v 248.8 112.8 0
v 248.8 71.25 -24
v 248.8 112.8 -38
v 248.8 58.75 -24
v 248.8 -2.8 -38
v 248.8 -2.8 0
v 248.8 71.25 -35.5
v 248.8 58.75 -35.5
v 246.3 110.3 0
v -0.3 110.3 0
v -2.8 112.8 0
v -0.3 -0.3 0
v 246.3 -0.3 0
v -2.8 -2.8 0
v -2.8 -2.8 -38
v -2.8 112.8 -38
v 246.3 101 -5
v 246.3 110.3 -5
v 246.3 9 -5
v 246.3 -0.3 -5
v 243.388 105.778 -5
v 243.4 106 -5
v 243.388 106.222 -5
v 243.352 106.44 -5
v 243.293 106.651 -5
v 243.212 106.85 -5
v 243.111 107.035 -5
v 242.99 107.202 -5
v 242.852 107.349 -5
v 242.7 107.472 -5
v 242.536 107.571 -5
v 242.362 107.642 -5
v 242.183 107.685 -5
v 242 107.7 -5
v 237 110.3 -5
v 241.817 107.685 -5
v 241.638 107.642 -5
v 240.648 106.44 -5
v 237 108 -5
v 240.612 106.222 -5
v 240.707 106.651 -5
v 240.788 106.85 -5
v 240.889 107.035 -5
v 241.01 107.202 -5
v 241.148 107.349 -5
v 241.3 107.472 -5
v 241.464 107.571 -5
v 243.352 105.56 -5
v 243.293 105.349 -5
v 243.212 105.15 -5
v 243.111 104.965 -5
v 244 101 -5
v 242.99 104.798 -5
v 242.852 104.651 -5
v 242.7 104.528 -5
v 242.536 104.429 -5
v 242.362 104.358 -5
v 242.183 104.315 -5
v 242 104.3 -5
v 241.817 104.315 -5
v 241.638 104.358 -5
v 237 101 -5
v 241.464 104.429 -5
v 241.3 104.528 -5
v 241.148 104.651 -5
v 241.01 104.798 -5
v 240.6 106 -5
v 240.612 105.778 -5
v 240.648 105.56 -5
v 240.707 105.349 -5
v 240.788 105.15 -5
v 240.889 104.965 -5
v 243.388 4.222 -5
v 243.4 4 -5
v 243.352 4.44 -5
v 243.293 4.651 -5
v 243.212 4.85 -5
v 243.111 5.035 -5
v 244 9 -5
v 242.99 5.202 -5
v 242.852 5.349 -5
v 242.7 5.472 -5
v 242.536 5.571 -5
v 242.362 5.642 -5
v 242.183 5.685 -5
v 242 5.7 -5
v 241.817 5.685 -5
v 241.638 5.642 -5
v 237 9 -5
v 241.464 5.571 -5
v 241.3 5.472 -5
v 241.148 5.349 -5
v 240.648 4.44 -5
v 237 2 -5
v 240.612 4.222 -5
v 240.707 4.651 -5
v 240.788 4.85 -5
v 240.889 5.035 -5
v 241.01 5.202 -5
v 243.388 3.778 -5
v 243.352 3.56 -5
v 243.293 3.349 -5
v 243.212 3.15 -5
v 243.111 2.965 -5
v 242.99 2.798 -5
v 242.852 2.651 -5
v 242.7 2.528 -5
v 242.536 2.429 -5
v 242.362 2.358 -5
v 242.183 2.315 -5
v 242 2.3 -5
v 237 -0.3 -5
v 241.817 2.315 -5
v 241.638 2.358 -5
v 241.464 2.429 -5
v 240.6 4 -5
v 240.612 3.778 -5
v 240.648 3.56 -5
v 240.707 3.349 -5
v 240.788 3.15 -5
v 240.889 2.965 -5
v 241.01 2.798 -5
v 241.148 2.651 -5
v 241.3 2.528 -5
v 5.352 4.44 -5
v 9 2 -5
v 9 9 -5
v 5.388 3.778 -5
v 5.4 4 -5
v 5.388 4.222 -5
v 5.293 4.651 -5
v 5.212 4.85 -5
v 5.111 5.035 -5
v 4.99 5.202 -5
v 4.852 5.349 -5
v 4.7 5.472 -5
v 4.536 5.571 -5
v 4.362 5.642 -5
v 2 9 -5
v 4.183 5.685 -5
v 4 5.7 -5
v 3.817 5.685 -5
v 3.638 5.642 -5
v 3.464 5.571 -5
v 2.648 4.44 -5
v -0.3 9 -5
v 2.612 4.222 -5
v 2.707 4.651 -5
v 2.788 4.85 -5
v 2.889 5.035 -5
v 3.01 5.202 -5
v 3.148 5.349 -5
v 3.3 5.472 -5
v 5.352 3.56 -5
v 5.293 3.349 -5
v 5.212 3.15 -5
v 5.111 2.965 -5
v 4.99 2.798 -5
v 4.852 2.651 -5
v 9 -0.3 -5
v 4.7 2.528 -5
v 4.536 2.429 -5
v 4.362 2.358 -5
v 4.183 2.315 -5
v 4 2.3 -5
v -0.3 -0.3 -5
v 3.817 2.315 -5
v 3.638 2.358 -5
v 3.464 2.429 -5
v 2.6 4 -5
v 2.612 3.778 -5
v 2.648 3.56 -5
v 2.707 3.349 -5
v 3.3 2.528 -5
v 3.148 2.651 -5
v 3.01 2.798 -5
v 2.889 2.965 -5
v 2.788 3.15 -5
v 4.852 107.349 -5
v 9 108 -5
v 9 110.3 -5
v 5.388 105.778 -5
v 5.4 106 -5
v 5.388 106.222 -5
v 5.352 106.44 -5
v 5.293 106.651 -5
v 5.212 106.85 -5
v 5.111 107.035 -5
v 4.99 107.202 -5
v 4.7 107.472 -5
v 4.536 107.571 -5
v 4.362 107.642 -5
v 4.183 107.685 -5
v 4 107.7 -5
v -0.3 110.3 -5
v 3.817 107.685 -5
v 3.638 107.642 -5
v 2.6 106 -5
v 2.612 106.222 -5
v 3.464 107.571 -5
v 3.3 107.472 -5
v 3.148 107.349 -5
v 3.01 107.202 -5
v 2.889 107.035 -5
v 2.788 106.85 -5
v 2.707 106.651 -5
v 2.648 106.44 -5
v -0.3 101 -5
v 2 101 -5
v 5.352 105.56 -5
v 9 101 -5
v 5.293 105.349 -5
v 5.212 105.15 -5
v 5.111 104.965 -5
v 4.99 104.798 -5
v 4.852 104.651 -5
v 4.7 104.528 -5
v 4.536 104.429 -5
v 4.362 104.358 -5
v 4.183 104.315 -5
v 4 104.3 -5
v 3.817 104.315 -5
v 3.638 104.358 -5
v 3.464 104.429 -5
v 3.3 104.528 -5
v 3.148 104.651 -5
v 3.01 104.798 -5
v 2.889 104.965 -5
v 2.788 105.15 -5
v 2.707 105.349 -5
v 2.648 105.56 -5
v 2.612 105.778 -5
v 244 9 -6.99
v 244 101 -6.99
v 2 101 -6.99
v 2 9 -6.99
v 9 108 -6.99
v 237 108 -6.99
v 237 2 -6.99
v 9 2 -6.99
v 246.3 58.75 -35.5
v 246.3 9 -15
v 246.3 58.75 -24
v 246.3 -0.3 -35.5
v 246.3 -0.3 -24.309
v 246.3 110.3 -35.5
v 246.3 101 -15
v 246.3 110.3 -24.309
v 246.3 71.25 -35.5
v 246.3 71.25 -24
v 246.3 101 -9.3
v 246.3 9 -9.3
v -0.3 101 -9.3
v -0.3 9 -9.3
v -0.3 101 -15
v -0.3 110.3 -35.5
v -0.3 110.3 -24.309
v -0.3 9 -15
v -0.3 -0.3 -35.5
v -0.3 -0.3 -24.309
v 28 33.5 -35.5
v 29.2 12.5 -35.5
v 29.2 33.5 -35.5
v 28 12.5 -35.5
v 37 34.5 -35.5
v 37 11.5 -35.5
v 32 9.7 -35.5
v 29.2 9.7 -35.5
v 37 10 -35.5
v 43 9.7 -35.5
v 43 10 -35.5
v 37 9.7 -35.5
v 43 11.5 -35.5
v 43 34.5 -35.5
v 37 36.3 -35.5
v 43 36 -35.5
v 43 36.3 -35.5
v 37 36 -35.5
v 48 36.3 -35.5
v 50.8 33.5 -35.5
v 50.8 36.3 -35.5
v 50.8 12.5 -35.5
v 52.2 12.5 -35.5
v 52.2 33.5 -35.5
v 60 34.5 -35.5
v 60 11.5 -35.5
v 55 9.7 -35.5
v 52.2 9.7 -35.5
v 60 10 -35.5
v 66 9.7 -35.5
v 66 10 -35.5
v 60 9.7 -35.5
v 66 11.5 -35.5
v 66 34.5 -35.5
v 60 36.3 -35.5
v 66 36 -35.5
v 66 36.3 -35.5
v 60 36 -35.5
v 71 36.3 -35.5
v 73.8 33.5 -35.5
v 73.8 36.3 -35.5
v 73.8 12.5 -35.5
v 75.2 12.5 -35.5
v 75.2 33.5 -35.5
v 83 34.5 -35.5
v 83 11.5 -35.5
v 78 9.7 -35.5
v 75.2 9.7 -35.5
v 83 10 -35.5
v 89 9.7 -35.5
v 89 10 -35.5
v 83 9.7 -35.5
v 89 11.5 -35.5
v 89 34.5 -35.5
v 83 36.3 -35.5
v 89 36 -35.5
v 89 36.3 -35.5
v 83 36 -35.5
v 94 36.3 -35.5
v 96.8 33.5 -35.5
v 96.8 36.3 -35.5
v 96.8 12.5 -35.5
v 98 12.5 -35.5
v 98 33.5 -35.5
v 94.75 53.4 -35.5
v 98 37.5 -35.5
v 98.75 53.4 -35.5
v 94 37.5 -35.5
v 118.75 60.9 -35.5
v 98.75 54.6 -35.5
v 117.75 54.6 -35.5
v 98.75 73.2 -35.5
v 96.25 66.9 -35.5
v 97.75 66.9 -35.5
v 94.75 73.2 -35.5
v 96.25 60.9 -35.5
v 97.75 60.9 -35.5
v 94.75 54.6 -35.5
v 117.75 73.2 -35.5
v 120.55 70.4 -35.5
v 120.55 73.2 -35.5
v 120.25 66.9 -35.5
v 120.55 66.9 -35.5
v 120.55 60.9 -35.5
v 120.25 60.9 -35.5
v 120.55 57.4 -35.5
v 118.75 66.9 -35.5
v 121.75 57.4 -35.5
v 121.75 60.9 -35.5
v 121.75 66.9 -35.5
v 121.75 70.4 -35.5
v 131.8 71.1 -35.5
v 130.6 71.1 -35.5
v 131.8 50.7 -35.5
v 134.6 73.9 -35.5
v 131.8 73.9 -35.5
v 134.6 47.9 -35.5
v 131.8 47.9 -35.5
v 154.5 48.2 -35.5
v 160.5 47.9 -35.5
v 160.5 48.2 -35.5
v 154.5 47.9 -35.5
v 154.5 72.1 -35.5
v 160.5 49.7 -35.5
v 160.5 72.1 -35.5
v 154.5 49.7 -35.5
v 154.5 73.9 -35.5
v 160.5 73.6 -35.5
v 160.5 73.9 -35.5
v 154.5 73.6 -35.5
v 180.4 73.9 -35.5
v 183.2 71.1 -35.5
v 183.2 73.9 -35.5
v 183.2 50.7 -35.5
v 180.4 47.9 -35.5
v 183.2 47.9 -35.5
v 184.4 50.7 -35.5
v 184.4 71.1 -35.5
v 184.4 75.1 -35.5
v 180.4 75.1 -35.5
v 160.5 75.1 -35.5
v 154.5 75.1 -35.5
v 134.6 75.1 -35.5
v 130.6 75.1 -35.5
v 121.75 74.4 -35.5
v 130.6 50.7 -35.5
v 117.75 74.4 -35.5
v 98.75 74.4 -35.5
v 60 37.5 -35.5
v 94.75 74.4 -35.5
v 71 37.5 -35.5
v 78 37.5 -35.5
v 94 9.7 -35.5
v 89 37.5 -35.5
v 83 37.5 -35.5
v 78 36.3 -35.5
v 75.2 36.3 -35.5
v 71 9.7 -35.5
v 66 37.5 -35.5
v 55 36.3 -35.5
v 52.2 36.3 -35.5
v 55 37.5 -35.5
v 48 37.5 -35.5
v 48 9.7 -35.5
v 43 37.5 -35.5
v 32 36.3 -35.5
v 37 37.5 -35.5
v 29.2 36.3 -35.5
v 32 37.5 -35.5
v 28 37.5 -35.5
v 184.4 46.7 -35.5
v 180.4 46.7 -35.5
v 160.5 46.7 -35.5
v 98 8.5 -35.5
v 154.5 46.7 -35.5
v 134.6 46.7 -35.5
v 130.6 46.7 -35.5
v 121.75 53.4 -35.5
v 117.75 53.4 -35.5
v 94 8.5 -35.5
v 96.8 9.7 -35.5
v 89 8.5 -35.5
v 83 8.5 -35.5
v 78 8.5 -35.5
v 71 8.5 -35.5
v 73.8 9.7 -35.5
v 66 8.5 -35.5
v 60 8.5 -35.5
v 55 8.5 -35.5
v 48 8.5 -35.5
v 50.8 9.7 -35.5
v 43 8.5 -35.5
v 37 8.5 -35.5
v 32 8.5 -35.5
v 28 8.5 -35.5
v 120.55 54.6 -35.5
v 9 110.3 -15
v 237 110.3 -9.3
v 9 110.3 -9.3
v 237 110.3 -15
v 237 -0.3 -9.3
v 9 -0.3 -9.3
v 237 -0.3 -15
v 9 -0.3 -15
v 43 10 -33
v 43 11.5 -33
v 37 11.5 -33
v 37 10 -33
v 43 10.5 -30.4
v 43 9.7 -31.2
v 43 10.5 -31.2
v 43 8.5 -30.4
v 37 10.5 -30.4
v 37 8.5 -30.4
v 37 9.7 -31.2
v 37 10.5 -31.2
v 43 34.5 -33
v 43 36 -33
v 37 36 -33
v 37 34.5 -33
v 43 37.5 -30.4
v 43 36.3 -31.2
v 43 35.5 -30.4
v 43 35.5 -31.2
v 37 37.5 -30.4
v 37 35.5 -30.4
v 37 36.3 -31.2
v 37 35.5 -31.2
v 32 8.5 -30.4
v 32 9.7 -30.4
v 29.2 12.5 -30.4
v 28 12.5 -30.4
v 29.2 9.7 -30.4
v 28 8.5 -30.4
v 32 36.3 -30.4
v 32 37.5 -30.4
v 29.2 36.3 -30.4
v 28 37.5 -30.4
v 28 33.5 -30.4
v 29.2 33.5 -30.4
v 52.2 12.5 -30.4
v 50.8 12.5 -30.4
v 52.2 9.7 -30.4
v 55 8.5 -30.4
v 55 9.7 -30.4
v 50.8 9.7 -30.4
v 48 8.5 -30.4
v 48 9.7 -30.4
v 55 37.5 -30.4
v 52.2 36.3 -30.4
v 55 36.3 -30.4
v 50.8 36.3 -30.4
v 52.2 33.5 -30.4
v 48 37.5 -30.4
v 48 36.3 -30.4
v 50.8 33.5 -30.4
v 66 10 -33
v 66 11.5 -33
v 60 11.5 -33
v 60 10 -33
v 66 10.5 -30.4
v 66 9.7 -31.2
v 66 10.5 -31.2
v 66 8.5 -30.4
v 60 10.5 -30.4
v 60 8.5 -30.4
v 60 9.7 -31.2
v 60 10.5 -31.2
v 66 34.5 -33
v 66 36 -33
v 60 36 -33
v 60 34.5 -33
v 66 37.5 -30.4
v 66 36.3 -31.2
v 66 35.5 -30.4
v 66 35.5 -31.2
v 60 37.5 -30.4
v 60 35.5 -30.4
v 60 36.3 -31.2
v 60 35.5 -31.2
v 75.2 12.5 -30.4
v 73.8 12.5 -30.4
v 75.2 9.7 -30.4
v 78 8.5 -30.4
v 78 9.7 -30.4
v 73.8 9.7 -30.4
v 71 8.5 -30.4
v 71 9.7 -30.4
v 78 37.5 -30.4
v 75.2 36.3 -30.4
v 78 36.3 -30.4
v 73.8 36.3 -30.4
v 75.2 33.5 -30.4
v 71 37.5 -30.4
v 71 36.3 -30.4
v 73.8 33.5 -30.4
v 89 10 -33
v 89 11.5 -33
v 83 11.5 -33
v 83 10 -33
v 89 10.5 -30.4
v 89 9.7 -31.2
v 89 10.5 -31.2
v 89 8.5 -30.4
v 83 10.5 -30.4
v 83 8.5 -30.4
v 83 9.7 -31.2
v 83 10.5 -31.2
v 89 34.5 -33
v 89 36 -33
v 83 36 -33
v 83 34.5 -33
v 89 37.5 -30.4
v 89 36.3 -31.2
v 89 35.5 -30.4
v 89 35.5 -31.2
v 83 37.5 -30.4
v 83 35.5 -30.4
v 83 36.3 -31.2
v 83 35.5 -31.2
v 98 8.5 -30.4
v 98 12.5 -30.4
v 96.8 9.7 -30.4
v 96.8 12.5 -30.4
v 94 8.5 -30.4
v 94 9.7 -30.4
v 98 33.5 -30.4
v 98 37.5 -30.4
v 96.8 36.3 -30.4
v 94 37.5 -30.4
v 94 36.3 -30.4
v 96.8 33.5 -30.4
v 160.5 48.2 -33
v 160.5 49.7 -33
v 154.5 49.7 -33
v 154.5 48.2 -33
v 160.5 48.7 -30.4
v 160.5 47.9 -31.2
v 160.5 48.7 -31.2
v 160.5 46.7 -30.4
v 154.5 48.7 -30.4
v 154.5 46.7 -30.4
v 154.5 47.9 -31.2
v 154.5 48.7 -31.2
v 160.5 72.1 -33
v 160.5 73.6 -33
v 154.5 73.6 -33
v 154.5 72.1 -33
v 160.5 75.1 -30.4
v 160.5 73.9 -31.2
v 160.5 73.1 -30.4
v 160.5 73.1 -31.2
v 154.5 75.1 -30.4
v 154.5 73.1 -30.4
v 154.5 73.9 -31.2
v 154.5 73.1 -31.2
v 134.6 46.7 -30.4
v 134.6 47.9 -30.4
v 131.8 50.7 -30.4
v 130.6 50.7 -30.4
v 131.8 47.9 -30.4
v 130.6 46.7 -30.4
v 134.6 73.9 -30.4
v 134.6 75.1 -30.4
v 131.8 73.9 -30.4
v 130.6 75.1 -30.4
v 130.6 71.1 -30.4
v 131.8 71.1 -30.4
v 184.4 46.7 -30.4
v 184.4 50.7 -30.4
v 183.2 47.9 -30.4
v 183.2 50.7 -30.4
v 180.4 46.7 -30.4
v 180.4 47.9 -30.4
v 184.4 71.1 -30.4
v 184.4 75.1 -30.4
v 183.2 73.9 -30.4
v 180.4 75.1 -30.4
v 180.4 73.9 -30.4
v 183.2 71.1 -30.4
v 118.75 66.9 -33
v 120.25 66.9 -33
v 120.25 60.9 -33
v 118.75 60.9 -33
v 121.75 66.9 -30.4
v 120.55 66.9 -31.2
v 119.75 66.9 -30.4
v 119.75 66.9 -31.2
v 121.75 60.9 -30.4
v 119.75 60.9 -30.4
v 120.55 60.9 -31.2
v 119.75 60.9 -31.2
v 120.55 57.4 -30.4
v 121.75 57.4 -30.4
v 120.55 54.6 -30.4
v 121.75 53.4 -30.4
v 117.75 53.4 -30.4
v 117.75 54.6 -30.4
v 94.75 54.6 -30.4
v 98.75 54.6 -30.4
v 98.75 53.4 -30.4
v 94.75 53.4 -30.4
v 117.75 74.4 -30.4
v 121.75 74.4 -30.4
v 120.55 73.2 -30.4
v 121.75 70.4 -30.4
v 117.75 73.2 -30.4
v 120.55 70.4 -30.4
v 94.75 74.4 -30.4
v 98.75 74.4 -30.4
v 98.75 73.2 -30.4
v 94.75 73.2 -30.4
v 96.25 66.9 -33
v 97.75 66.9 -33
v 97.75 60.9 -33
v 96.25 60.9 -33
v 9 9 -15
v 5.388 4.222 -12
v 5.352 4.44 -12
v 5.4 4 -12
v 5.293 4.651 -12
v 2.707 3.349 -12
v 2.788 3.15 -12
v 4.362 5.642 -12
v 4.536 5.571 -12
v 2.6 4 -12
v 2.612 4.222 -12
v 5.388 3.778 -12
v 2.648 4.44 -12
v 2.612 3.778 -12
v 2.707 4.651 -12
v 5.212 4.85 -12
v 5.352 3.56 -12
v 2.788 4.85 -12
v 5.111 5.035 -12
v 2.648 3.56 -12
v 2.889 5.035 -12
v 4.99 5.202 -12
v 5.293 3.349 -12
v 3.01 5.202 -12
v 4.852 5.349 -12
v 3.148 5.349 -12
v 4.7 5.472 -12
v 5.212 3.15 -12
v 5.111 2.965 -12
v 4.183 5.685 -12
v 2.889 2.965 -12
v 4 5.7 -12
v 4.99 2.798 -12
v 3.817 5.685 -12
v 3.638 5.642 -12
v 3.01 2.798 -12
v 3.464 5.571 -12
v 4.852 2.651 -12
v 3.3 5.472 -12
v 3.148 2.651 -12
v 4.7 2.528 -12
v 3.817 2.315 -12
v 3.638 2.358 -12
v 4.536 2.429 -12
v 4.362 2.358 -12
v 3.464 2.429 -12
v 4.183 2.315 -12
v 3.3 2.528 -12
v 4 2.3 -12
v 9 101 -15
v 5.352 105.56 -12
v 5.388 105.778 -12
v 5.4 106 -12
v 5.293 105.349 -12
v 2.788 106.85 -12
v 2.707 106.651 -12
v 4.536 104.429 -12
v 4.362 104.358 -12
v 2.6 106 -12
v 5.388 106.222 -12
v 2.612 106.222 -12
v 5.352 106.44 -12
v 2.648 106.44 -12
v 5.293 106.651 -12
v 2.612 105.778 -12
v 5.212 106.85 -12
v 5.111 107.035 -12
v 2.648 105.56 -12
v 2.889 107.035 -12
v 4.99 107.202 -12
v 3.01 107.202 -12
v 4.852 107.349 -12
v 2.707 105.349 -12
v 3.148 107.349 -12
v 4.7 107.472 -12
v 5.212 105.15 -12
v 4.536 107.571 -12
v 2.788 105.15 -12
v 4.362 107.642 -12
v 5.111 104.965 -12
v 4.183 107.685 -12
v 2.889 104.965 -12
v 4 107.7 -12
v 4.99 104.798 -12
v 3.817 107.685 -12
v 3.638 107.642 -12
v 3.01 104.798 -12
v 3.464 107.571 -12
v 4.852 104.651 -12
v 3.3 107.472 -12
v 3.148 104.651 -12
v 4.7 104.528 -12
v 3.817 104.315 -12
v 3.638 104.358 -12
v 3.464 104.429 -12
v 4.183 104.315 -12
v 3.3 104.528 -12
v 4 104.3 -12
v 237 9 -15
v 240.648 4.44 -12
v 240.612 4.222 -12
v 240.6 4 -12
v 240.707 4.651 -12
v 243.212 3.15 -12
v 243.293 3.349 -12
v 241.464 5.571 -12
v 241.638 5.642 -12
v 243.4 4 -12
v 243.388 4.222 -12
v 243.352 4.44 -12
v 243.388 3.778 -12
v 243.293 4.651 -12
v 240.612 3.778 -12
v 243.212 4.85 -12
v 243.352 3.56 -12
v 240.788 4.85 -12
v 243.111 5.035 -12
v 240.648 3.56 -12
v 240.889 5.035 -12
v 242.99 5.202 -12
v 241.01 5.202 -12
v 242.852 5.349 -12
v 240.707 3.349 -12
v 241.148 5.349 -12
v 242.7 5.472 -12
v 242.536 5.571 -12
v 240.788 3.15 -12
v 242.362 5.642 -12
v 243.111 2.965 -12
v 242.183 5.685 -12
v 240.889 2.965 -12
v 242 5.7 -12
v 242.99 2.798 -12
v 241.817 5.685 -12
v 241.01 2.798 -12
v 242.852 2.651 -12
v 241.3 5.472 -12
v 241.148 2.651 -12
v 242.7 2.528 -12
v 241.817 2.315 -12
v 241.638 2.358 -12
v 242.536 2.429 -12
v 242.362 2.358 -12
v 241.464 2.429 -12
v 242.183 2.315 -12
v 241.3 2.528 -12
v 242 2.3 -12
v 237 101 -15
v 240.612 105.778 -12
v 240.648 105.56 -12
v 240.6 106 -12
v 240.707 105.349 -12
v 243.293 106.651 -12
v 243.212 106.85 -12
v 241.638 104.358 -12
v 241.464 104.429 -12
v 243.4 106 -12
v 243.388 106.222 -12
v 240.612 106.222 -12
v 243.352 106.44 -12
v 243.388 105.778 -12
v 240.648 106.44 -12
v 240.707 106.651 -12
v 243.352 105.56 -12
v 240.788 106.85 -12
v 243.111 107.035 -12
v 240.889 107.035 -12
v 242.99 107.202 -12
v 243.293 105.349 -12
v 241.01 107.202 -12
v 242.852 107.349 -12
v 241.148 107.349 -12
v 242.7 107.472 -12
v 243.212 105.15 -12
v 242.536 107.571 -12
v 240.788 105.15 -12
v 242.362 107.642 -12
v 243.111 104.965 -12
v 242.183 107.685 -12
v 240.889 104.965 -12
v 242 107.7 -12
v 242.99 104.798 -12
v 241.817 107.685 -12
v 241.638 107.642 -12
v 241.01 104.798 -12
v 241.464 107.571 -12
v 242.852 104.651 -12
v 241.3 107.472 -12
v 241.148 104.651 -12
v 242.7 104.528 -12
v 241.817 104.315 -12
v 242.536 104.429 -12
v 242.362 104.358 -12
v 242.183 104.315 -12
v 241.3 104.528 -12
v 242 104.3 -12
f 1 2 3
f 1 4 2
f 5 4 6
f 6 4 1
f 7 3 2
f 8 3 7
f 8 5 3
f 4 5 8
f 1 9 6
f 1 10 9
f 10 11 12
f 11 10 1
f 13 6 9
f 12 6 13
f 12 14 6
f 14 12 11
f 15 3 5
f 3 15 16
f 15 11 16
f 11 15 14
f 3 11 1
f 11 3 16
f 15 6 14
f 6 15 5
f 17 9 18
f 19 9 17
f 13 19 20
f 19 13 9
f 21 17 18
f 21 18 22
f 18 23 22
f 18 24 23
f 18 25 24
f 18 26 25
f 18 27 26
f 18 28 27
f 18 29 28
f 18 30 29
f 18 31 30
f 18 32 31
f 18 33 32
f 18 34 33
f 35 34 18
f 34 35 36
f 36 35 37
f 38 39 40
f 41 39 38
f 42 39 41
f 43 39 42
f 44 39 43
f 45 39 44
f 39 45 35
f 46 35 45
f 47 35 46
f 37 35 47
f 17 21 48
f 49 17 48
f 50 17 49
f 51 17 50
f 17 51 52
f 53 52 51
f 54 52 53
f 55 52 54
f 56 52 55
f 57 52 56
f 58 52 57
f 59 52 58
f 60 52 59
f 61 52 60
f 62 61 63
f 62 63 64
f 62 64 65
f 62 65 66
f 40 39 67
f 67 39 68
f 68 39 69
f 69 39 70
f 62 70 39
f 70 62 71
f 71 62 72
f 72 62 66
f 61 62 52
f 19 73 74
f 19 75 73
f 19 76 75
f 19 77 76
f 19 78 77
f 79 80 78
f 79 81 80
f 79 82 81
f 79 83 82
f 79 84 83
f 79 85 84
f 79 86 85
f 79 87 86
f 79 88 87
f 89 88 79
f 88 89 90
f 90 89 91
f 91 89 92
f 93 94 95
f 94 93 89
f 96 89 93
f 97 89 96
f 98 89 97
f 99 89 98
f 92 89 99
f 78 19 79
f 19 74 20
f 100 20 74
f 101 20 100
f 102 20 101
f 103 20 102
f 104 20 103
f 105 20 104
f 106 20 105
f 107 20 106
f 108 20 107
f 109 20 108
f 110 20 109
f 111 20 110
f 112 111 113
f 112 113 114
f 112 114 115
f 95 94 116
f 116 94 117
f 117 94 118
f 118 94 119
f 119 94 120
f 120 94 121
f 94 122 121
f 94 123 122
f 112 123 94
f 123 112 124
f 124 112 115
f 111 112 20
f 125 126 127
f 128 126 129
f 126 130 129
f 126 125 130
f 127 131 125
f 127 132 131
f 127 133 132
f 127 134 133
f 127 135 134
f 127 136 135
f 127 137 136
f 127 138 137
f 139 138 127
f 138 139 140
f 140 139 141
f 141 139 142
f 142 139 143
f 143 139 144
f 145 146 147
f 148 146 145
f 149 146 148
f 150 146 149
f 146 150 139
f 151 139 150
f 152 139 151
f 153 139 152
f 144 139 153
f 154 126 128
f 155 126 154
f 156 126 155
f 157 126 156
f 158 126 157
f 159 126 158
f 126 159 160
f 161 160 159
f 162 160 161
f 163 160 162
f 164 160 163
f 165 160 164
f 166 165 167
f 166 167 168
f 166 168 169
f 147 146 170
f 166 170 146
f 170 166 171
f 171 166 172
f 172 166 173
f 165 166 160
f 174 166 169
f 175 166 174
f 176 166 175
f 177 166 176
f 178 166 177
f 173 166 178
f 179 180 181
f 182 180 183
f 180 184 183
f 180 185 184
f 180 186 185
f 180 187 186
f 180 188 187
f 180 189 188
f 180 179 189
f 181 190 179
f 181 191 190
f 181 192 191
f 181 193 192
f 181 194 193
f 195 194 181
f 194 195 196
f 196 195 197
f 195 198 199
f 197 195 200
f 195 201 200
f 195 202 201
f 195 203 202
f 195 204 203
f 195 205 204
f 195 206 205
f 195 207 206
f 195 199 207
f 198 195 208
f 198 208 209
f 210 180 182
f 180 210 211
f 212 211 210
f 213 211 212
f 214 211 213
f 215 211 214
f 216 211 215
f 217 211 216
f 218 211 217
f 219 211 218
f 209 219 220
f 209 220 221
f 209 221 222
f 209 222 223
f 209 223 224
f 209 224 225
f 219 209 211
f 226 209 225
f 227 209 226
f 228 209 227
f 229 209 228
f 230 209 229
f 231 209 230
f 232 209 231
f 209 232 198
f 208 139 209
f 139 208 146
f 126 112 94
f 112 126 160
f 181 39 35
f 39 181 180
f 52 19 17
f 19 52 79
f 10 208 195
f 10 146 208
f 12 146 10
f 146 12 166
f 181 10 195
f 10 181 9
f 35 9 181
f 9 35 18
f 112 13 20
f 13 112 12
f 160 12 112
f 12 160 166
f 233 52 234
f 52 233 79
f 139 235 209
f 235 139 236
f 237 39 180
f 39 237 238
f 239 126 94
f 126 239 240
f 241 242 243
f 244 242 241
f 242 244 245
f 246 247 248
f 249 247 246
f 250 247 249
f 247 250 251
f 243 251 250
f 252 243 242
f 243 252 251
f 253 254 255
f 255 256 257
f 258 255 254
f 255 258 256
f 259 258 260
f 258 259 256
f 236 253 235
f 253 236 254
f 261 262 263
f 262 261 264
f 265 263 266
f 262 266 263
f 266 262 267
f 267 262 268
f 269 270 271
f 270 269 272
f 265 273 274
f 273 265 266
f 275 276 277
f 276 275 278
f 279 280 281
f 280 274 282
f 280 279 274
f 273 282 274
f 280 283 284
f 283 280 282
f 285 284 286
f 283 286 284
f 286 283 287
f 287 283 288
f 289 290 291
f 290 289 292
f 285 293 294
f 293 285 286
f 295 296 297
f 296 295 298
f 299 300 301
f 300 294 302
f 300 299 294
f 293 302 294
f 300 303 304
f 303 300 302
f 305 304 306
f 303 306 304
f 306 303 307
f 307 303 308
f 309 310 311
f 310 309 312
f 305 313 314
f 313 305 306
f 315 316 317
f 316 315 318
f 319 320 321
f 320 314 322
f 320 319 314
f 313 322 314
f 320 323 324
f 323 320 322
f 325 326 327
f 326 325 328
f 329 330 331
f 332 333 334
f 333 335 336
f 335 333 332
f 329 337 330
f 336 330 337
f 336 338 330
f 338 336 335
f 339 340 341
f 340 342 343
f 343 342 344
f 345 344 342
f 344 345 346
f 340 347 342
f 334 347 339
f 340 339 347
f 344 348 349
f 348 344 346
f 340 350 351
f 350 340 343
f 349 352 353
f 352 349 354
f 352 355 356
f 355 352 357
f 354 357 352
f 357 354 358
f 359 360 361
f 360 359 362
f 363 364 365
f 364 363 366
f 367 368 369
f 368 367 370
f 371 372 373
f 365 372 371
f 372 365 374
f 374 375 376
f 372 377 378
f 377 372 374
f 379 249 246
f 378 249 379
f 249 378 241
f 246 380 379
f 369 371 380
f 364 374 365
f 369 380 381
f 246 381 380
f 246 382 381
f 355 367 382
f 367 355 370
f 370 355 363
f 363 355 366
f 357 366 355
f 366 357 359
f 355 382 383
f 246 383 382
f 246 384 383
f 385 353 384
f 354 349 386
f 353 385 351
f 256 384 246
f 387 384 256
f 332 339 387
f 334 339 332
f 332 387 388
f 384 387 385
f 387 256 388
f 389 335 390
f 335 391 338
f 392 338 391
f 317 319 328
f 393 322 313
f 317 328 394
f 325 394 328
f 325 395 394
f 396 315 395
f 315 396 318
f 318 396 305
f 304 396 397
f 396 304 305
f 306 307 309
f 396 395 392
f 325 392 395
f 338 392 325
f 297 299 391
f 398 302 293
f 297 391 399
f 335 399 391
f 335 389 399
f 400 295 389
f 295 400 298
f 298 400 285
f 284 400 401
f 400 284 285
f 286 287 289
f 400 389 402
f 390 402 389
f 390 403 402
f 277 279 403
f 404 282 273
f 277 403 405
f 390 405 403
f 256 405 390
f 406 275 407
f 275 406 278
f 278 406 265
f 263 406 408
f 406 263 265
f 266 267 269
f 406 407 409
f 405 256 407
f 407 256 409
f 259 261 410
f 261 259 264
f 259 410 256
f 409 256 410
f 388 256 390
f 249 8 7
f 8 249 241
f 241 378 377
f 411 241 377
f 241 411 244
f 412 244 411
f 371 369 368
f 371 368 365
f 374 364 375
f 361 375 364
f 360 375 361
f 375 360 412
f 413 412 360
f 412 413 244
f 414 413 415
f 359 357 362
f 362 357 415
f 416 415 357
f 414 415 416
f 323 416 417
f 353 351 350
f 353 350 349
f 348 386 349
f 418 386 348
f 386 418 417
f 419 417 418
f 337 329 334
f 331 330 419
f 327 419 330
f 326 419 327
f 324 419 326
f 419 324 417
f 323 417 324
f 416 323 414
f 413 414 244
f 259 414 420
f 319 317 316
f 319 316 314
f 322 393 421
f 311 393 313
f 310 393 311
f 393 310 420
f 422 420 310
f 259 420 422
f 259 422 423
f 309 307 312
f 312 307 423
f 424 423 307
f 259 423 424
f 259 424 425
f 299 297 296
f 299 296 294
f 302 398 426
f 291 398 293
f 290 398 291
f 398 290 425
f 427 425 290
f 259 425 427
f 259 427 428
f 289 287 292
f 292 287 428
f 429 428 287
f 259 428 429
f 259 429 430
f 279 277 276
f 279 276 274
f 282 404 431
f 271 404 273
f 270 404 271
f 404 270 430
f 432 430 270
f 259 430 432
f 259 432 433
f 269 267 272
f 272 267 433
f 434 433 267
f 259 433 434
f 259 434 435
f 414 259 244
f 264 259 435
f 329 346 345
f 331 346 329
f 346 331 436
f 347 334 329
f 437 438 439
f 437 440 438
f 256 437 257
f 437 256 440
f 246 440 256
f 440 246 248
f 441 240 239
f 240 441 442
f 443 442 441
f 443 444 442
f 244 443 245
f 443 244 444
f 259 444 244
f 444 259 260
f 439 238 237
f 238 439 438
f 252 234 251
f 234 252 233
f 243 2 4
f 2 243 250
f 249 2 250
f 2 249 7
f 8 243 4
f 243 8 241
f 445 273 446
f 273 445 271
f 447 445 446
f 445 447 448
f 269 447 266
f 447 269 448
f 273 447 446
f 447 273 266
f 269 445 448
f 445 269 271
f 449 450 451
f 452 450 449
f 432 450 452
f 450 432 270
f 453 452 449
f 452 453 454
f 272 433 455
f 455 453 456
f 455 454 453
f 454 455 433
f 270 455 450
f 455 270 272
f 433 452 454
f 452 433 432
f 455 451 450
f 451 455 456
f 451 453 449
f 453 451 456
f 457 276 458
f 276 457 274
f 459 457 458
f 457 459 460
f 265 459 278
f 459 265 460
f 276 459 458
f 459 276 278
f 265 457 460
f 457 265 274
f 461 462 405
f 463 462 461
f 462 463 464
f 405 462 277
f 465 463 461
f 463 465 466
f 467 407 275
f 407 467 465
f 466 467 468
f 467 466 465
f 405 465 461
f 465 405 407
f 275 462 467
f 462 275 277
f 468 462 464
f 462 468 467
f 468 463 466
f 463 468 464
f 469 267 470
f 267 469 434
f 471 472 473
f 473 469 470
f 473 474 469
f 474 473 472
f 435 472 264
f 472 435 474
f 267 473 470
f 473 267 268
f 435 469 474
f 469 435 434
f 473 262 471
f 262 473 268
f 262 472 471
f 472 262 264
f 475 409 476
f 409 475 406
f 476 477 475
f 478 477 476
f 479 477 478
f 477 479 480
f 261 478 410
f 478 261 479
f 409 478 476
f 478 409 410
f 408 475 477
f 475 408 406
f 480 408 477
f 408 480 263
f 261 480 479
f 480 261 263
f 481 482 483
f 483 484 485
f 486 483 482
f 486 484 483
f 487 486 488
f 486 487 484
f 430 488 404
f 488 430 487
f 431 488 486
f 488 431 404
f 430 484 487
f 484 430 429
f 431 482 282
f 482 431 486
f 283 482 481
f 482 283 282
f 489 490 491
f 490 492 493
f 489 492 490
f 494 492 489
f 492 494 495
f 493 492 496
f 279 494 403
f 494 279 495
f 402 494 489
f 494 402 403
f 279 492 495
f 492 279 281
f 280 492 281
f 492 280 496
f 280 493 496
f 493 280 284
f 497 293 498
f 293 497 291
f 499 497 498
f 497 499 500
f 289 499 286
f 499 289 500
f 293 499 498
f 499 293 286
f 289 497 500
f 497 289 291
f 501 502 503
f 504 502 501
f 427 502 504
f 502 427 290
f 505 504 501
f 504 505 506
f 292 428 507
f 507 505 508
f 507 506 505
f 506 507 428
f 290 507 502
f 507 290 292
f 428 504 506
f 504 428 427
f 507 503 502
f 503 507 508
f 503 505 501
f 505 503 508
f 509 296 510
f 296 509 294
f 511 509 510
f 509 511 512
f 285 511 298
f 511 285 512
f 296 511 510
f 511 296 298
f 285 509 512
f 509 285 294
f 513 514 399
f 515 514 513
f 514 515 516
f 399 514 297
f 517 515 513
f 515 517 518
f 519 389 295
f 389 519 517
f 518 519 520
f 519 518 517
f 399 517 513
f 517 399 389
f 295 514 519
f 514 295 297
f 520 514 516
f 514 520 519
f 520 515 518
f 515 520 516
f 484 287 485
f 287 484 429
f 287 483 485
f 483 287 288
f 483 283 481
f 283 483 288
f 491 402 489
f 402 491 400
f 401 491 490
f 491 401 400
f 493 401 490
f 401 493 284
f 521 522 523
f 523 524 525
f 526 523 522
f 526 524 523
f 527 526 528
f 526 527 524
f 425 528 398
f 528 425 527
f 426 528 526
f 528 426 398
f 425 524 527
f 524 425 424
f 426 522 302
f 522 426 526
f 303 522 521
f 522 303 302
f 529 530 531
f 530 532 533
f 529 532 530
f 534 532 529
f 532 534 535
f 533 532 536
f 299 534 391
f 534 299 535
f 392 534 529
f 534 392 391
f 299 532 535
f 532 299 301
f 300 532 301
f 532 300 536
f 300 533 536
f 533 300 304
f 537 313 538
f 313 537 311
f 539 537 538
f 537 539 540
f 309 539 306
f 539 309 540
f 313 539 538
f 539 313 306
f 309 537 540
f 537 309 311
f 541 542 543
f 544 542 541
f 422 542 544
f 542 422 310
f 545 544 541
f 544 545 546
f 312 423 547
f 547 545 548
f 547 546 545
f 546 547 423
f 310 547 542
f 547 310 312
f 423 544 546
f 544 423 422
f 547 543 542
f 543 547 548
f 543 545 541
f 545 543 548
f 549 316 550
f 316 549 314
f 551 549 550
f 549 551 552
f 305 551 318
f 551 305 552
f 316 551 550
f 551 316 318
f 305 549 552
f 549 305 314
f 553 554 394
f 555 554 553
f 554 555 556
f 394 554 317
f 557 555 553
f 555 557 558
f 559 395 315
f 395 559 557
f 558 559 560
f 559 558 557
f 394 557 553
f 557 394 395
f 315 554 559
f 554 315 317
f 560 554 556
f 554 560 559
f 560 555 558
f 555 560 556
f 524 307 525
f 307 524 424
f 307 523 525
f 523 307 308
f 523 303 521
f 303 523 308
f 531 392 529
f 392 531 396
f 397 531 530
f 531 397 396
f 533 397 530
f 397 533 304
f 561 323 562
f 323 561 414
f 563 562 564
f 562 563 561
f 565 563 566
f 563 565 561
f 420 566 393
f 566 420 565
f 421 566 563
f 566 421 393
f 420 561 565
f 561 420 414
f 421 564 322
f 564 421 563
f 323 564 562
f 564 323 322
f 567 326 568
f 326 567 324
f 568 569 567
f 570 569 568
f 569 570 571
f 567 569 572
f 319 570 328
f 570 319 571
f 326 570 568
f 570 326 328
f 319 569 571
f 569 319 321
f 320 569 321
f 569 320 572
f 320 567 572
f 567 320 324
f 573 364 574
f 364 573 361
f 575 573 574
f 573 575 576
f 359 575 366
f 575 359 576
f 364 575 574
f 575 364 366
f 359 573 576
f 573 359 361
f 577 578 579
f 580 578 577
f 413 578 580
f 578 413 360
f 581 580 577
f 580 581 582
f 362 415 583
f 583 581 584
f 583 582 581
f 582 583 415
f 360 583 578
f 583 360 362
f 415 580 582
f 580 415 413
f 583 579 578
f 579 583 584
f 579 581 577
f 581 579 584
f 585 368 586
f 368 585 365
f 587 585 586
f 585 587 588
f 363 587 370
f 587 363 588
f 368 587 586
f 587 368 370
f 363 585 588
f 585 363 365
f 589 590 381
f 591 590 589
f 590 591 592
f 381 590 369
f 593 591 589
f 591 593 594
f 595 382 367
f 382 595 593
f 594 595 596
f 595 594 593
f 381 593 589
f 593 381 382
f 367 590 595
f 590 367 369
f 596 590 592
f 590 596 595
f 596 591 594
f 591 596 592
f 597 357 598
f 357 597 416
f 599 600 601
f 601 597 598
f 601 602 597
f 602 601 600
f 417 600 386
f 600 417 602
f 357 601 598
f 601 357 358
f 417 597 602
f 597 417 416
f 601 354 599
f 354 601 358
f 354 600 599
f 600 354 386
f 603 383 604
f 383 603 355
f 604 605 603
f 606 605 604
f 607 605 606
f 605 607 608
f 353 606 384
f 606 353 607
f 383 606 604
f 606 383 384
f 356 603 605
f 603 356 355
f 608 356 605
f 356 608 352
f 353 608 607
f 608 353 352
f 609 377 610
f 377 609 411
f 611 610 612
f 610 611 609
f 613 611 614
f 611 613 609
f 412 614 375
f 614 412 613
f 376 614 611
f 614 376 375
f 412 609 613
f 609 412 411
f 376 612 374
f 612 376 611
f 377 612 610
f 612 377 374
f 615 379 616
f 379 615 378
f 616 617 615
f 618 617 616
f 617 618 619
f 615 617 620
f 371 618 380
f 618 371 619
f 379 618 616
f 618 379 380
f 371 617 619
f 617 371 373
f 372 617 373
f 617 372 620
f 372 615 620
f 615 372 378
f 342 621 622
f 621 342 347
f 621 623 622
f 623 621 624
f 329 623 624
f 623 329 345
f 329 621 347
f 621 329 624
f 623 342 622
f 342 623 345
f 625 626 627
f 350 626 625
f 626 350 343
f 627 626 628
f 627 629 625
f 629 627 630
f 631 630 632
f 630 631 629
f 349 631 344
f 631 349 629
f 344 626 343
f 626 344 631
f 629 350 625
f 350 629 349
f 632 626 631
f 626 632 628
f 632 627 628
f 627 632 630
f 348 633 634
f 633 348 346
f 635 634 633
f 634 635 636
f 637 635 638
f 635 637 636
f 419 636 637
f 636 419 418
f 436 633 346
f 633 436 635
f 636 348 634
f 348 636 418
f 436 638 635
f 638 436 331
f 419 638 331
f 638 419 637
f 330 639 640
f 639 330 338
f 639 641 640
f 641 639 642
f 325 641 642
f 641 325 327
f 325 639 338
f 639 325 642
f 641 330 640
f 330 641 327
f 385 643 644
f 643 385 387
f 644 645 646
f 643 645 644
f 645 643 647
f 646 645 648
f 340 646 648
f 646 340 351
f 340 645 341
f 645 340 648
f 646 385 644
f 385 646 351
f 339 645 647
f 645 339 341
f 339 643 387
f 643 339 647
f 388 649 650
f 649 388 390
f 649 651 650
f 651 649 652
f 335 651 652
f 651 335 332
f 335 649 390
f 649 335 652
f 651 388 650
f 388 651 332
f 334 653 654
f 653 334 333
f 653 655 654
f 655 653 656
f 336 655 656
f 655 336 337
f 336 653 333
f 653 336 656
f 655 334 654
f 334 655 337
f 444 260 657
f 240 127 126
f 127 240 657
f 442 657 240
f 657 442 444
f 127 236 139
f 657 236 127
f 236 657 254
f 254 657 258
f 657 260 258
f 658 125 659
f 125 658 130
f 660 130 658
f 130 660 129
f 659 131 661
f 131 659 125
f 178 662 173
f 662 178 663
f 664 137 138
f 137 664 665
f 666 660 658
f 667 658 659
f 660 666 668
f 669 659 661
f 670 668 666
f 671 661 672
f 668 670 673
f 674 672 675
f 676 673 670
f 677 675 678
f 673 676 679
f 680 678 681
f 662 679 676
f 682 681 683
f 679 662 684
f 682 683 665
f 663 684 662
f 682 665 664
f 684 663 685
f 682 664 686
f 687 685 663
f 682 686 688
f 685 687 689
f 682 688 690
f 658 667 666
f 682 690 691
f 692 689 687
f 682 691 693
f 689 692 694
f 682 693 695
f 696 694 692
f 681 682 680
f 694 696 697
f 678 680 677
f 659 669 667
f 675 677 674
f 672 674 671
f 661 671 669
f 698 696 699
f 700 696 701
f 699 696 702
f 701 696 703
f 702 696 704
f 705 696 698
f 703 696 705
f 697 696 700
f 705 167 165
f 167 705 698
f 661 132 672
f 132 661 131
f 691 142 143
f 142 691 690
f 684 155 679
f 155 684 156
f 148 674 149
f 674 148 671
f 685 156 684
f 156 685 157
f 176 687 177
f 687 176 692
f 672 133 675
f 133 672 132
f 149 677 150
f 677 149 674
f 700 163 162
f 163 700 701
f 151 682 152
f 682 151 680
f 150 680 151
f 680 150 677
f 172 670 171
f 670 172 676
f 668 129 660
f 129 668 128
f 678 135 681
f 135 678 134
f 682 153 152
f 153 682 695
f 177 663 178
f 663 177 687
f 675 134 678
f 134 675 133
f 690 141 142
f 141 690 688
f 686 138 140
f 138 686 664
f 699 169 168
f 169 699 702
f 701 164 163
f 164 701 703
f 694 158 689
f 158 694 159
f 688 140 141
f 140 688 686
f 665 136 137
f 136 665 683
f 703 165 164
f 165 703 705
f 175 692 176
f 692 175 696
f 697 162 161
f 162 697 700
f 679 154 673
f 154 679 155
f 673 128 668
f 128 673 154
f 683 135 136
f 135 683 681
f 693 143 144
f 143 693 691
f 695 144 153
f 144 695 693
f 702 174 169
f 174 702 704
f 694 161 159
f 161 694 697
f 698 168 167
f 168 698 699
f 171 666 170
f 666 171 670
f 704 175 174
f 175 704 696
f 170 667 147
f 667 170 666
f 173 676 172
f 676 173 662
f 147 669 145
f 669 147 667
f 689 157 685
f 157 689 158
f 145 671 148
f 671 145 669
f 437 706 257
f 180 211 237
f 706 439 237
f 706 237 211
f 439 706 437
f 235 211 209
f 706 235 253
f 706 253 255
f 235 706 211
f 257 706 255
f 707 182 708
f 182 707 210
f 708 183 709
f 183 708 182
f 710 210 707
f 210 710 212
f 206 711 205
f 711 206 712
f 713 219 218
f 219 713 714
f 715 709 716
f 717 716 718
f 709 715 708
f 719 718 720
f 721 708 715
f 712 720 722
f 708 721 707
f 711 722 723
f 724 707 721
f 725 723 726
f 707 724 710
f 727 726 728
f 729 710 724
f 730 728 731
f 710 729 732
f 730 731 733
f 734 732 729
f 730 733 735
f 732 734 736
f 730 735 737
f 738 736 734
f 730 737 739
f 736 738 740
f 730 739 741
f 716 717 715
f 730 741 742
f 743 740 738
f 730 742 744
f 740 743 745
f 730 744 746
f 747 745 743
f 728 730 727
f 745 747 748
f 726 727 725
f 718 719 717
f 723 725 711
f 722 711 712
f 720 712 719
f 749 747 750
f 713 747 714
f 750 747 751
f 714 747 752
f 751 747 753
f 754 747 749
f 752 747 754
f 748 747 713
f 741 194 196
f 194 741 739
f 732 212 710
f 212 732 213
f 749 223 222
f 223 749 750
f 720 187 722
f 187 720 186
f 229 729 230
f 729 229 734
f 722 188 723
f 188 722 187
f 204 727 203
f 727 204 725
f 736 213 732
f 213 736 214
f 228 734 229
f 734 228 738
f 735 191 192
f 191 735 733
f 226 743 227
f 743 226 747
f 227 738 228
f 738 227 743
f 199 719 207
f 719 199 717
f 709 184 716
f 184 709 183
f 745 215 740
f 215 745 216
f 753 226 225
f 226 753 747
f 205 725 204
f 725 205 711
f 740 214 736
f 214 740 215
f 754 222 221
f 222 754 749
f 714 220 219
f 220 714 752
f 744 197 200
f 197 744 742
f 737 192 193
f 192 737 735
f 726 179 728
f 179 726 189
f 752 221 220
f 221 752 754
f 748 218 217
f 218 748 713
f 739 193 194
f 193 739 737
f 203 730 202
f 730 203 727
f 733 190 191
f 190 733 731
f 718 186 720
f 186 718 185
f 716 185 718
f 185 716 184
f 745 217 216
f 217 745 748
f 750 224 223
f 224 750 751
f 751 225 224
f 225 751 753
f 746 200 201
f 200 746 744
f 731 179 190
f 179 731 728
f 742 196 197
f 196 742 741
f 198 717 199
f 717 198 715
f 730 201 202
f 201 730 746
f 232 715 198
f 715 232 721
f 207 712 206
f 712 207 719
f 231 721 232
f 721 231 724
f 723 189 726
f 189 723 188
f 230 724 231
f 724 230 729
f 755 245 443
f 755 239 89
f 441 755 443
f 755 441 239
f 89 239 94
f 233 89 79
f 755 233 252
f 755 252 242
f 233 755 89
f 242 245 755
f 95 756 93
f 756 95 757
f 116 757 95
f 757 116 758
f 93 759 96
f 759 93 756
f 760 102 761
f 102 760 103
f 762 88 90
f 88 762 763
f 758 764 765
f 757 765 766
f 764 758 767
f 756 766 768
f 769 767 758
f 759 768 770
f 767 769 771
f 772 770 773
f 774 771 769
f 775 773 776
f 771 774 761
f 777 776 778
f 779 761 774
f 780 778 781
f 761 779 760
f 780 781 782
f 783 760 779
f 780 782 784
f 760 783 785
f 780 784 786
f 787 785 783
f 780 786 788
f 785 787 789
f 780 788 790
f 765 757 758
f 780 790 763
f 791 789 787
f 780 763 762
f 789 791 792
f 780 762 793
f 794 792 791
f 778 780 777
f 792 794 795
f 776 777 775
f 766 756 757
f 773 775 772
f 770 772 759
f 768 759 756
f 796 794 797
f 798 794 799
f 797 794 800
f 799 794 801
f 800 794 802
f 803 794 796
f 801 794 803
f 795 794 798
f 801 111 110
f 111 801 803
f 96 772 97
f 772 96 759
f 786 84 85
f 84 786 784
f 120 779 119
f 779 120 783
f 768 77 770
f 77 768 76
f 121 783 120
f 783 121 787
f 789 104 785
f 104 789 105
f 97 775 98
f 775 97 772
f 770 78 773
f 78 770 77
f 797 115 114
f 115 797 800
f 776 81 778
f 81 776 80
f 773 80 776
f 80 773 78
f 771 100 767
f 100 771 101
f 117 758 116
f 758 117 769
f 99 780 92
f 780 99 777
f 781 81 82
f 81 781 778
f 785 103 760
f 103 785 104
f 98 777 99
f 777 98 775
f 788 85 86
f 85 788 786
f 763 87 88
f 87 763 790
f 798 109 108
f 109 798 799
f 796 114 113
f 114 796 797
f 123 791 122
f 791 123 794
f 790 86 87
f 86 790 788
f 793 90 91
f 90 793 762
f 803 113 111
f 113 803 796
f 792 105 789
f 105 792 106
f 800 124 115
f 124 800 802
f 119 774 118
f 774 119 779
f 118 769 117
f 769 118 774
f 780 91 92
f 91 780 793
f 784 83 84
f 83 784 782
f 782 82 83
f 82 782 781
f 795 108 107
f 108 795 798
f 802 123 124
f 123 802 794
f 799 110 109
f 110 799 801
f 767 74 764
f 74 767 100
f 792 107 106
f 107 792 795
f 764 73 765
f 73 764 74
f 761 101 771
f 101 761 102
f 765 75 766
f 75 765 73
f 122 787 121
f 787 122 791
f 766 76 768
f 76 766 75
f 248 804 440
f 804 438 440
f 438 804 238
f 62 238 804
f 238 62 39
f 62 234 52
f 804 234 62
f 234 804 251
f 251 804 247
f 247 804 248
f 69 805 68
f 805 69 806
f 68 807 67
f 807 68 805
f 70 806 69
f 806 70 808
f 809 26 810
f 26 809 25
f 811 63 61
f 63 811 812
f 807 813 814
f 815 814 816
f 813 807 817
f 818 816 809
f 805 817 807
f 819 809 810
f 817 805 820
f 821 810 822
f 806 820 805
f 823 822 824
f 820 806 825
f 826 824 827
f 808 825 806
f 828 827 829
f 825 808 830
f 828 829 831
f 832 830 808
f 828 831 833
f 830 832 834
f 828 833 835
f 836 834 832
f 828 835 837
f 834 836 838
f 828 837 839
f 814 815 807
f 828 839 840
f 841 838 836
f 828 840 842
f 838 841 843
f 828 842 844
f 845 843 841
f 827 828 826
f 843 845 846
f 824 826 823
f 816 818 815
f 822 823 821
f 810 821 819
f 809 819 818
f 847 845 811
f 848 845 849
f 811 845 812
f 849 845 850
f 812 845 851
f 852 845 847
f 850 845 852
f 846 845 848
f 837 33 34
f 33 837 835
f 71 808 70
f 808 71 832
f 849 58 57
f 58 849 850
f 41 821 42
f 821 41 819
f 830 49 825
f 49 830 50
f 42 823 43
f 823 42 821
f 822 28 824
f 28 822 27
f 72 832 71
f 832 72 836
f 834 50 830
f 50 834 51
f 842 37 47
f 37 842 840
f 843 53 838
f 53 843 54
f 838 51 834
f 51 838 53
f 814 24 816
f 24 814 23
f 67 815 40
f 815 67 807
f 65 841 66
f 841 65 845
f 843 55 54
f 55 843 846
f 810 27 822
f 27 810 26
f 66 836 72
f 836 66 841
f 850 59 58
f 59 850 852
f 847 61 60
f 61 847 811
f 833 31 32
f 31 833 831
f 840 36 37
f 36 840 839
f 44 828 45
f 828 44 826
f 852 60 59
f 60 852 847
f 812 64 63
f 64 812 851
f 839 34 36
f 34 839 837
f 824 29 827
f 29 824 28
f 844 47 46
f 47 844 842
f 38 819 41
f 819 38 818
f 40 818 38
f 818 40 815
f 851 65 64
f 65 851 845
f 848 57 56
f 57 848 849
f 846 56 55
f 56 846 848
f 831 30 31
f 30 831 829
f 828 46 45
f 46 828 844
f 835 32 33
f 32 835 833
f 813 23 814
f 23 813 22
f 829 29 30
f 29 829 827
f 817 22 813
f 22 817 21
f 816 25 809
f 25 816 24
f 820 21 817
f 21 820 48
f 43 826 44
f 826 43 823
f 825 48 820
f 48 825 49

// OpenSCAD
// Simple box the overhead panel drops into. The panel and its full-size
// diffuser sit flush with the rim on a ledge round the edge and are held by
// M3 self-tapping screws through the corner holes into corner blocks.
// z = 0 is the panel's front face; the box prints open side up.
part = "enclosure"; // [enclosure, pcbs, chips] - pcbs/chips are viewer stand-ins

// Panel numbers, must match oh_panel.scad
panel_width = 246;
panel_height = 110;
panel_depth = 3;
diffuser_depth = 2;   // runs to the panel edges
hole_inset = 4;       // panel corner holes

depth = 38;           // overall, panel front to box back
wall = 2.5;
floor_t = 2.5;
clearance = 0.3;      // panel to pocket wall, each side
ledge = 2;            // diffuser overlap on the ledge
ledge_t = 2;

// Corner blocks
block = 9;            // reaches this far in from the panel edges
block_h = 10;         // solid depth below the diffuser before the 45 deg underside
screw_hole = [2.8, 3.4]; // oval M3 self-tap hole (x, y), not too tight
screw_depth = 7;

// USB-B cutout, right wall: square shell + clearance - VERIFY against the connector
usb_w = 12.5;         // across (Y)
usb_h = 11.5;         // tall (Z)
usb_y = 65;           // clears the ANTI ICE ENG korry below it (housing reaches Y ~55.7)
usb_z = -(depth - floor_t) + usb_h/2; // flush against the inner face of the floor (base)

// Electronics on the floor, clear of the korries (backs ~7.9 mm above the
// floor): MCPs and ESP under EXT LT (toggle lugs ~16.5 mm), TLC under ENG.
// Positions are each board's lower-left corner in panel X/Y.
board_lift = 2.5;     // floor to PCB underside, room for clipped pin tails
pcb_t = 1.6;
board_gap = 0.3;      // board outline to cradle wall
cradle_wall = 1.2;
clip_w = 6;           // clip wall width at each end
clip_lip = 0.5;       // overhang onto the board's top face
corner_arm = 4;       // L-shaped locating corners
// HW-839 MCP23017 breakout, no holes: clip cradle, pads run along the 26 mm edges
mcp_size = [21, 26];
mcp_toggle_x = [40, 63, 86]; // EXT LT toggle columns; pin rows land either side of the toggle body
mcp_pos = [for (x = mcp_toggle_x) [x - mcp_size[0]/2, 10]];
// Adafruit TLC5947: clip cradle, clips on the long edges, headers on the short ends stay clear
tlc_size = [50.8, 25.4];
// Centred in the ENG section (x 129.5-185.5), cradle ~0.5 mm under the
// top-row korry housings (bottom edge y 75.64)
tlc_pos = [157.5 - tlc_size[0]/2, 48.2];
// ESP32-S3 SuperMini, size varies by maker - VERIFY; USB-C end left open, facing -X
// so the plug clears the TLC cradle
esp_size = [18, 24];  // local: USB at the +Y end
// Lower-left corner of the footprint: over the upper APU korry (top edge
// y 52.16), under the top-row korries (bottom edge y 75.64), 6 mm left of the
// APU column to clear the TLC
esp_pos = [114.25 - 6 - esp_size[1]/2, (52.16 + 75.64)/2 - esp_size[0]/2];

$fn = 48;

W = panel_width;
H = panel_height;
stack = panel_depth + diffuser_depth; // panel + diffuser thickness
stack_back = -stack;

module shell() {
  difference() {
    translate([-clearance - wall, -clearance - wall, -depth])
      cube([W + 2*(clearance + wall), H + 2*(clearance + wall), depth]);
    // Pocket for panel + diffuser, panel front flush with the rim
    translate([-clearance, -clearance, stack_back])
      cube([W + 2*clearance, H + 2*clearance, stack + 1]);
    // Opening through the ledge
    translate([ledge, ledge, stack_back - ledge_t - 1])
      cube([W - 2*ledge, H - 2*ledge, ledge_t + 2]);
    // Main cavity below the ledge, narrowing at 45 deg into the ledge opening
    // so the ledge's underside prints without support
    ledge_in = ledge + clearance;
    ledge_bot = stack_back - ledge_t;
    hull() {
      translate([-clearance, -clearance, -depth + floor_t])
        cube([W + 2*clearance, H + 2*clearance, ledge_bot - ledge_in - (-depth + floor_t)]);
      translate([ledge, ledge, ledge_bot - 0.01])
        cube([W - 2*ledge, H - 2*ledge, 0.02]);
    }
    // USB-B cutout through the right wall, above the ANTI ICE ENG korry and
    // flush with the floor so a panel-mount jack's body doesn't need depth
    // past the back of the case
    translate([W + clearance - 2, usb_y - usb_w/2, usb_z - usb_h/2])
      cube([wall + 4, usb_w, usb_h]);
  }
}

// Bottom-left block in panel coordinates; the others are mirrors of it.
// Top face sits against the diffuser's back, with an oval screw hole under
// the panel's corner hole.
module corner_block() {
  x0 = -clearance - wall/2; // overlaps the wall so it fuses
  size = block - x0;
  difference() {
    hull() {
      translate([x0, x0, stack_back - block_h])
        cube([size, size, block_h]);
      // 45 deg underside so it prints without support
      translate([x0, x0, stack_back - block_h - size])
        cube([0.01, 0.01, 0.01]);
    }
    translate([hole_inset, hole_inset, stack_back - screw_depth])
      scale([screw_hole[0] / screw_hole[1], 1, 1])
        cylinder(d = screw_hole[1], h = screw_depth + 0.01);
  }
}

floor_z = -(depth - floor_t);

// Cradle in local coords: board at [0..size.x, 0..size.y], clips on the -Y and
// +Y ends (open_end leaves the +Y end free), L corners locate the board.
module cradle(size, open_end = false) {
  top = board_lift + pcb_t;
  g = board_gap;
  t = cradle_wall;
  translate([0, 0, floor_z]) {
    for (end = open_end ? [0] : [0, 1]) {
      yw = end == 0 ? -g - t : size[1] + g;
      ys = end == 0 ? 0 : size[1] - 1.5;
      // Ledge under the board end
      translate([size[0]/2 - clip_w/2, ys, 0]) cube([clip_w, 1.5, board_lift]);
      // Clip wall with a lip over the board's top face
      translate([size[0]/2 - clip_w/2, yw, 0]) cube([clip_w, t, top + 0.2 + 0.8]);
      translate([size[0]/2 - clip_w/2, end == 0 ? -g : size[1] + g - clip_lip - g, top + 0.2])
        cube([clip_w, clip_lip + g, 0.8]);
    }
    if (open_end) // ledge under the USB end
      translate([size[0]/2 - clip_w/2, size[1] - 1.5, 0]) cube([clip_w, 1.5, board_lift]);
    for (cx = [0, 1], cy = [0, 1]) {
      x = cx == 0 ? -g - t : size[0] + g;
      y = cy == 0 ? -g - t : size[1] + g;
      // Arm along X (skipped on the open end), arm along Y
      if (!(open_end && cy == 1))
        translate([cx == 0 ? x : x - corner_arm + t, y, 0]) cube([corner_arm, t, top + 1]);
      translate([x, cy == 0 ? y : y - corner_arm + t, 0]) cube([t, corner_arm, top + 1]);
    }
  }
}

module electronics_mounts() {
  for (p = mcp_pos) translate(p) cradle(mcp_size);
  translate(tlc_pos) cradle(tlc_size);
  // Turn so the local +Y (USB) end faces -X
  translate([esp_pos[0] + esp_size[1], esp_pos[1], 0]) rotate(90) cradle(esp_size, open_end = true);
}

module enclosure() {
  shell();
  electronics_mounts();
  for (mx = [0, 1], my = [0, 1])
    translate([W/2, H/2, 0])
      mirror([mx, 0, 0]) mirror([0, my, 0])
        translate([-W/2, -H/2, 0])
          corner_block();
}

// Viewer stand-ins, approximate: board slabs, main IC / connector blocks
module board_at(pos, size) {
  translate([pos[0], pos[1], floor_z + board_lift]) cube([size[0], size[1], pcb_t]);
}

module pcbs() {
  for (p = mcp_pos) board_at(p, mcp_size);
  board_at(tlc_pos, tlc_size);
  board_at(esp_pos, [esp_size[1], esp_size[0]]);
}

module chips() {
  z = floor_z + board_lift + pcb_t;
  // MCP23017 SOIC-28 in the middle of each breakout
  for (p = mcp_pos)
    translate([p[0] + mcp_size[0]/2 - 3.75, p[1] + mcp_size[1]/2 - 9, z]) cube([7.5, 18, 2.5]);
  // TLC5947 and the 2-pin power terminal block
  translate([tlc_pos[0] + tlc_size[0]/2 - 3, tlc_pos[1] + tlc_size[1]/2 - 5, z]) cube([6, 10, 1.2]);
  translate([tlc_pos[0] + 13.2 - 3.5, tlc_pos[1] + 12.7 - 3.5, z]) cube([7, 7, 8]);
  // ESP32-S3 chip and the USB-C socket at the -X end
  translate([esp_pos[0] + esp_size[1] - 15, esp_pos[1] + esp_size[0]/2 - 3.5, z]) cube([7, 7, 1]);
  translate([esp_pos[0] - 0.5, esp_pos[1] + esp_size[0]/2 - 4.5, z]) cube([7.5, 9, 3.2]);
}

if (part == "pcbs") pcbs();
else if (part == "chips") chips();
else enclosure();
